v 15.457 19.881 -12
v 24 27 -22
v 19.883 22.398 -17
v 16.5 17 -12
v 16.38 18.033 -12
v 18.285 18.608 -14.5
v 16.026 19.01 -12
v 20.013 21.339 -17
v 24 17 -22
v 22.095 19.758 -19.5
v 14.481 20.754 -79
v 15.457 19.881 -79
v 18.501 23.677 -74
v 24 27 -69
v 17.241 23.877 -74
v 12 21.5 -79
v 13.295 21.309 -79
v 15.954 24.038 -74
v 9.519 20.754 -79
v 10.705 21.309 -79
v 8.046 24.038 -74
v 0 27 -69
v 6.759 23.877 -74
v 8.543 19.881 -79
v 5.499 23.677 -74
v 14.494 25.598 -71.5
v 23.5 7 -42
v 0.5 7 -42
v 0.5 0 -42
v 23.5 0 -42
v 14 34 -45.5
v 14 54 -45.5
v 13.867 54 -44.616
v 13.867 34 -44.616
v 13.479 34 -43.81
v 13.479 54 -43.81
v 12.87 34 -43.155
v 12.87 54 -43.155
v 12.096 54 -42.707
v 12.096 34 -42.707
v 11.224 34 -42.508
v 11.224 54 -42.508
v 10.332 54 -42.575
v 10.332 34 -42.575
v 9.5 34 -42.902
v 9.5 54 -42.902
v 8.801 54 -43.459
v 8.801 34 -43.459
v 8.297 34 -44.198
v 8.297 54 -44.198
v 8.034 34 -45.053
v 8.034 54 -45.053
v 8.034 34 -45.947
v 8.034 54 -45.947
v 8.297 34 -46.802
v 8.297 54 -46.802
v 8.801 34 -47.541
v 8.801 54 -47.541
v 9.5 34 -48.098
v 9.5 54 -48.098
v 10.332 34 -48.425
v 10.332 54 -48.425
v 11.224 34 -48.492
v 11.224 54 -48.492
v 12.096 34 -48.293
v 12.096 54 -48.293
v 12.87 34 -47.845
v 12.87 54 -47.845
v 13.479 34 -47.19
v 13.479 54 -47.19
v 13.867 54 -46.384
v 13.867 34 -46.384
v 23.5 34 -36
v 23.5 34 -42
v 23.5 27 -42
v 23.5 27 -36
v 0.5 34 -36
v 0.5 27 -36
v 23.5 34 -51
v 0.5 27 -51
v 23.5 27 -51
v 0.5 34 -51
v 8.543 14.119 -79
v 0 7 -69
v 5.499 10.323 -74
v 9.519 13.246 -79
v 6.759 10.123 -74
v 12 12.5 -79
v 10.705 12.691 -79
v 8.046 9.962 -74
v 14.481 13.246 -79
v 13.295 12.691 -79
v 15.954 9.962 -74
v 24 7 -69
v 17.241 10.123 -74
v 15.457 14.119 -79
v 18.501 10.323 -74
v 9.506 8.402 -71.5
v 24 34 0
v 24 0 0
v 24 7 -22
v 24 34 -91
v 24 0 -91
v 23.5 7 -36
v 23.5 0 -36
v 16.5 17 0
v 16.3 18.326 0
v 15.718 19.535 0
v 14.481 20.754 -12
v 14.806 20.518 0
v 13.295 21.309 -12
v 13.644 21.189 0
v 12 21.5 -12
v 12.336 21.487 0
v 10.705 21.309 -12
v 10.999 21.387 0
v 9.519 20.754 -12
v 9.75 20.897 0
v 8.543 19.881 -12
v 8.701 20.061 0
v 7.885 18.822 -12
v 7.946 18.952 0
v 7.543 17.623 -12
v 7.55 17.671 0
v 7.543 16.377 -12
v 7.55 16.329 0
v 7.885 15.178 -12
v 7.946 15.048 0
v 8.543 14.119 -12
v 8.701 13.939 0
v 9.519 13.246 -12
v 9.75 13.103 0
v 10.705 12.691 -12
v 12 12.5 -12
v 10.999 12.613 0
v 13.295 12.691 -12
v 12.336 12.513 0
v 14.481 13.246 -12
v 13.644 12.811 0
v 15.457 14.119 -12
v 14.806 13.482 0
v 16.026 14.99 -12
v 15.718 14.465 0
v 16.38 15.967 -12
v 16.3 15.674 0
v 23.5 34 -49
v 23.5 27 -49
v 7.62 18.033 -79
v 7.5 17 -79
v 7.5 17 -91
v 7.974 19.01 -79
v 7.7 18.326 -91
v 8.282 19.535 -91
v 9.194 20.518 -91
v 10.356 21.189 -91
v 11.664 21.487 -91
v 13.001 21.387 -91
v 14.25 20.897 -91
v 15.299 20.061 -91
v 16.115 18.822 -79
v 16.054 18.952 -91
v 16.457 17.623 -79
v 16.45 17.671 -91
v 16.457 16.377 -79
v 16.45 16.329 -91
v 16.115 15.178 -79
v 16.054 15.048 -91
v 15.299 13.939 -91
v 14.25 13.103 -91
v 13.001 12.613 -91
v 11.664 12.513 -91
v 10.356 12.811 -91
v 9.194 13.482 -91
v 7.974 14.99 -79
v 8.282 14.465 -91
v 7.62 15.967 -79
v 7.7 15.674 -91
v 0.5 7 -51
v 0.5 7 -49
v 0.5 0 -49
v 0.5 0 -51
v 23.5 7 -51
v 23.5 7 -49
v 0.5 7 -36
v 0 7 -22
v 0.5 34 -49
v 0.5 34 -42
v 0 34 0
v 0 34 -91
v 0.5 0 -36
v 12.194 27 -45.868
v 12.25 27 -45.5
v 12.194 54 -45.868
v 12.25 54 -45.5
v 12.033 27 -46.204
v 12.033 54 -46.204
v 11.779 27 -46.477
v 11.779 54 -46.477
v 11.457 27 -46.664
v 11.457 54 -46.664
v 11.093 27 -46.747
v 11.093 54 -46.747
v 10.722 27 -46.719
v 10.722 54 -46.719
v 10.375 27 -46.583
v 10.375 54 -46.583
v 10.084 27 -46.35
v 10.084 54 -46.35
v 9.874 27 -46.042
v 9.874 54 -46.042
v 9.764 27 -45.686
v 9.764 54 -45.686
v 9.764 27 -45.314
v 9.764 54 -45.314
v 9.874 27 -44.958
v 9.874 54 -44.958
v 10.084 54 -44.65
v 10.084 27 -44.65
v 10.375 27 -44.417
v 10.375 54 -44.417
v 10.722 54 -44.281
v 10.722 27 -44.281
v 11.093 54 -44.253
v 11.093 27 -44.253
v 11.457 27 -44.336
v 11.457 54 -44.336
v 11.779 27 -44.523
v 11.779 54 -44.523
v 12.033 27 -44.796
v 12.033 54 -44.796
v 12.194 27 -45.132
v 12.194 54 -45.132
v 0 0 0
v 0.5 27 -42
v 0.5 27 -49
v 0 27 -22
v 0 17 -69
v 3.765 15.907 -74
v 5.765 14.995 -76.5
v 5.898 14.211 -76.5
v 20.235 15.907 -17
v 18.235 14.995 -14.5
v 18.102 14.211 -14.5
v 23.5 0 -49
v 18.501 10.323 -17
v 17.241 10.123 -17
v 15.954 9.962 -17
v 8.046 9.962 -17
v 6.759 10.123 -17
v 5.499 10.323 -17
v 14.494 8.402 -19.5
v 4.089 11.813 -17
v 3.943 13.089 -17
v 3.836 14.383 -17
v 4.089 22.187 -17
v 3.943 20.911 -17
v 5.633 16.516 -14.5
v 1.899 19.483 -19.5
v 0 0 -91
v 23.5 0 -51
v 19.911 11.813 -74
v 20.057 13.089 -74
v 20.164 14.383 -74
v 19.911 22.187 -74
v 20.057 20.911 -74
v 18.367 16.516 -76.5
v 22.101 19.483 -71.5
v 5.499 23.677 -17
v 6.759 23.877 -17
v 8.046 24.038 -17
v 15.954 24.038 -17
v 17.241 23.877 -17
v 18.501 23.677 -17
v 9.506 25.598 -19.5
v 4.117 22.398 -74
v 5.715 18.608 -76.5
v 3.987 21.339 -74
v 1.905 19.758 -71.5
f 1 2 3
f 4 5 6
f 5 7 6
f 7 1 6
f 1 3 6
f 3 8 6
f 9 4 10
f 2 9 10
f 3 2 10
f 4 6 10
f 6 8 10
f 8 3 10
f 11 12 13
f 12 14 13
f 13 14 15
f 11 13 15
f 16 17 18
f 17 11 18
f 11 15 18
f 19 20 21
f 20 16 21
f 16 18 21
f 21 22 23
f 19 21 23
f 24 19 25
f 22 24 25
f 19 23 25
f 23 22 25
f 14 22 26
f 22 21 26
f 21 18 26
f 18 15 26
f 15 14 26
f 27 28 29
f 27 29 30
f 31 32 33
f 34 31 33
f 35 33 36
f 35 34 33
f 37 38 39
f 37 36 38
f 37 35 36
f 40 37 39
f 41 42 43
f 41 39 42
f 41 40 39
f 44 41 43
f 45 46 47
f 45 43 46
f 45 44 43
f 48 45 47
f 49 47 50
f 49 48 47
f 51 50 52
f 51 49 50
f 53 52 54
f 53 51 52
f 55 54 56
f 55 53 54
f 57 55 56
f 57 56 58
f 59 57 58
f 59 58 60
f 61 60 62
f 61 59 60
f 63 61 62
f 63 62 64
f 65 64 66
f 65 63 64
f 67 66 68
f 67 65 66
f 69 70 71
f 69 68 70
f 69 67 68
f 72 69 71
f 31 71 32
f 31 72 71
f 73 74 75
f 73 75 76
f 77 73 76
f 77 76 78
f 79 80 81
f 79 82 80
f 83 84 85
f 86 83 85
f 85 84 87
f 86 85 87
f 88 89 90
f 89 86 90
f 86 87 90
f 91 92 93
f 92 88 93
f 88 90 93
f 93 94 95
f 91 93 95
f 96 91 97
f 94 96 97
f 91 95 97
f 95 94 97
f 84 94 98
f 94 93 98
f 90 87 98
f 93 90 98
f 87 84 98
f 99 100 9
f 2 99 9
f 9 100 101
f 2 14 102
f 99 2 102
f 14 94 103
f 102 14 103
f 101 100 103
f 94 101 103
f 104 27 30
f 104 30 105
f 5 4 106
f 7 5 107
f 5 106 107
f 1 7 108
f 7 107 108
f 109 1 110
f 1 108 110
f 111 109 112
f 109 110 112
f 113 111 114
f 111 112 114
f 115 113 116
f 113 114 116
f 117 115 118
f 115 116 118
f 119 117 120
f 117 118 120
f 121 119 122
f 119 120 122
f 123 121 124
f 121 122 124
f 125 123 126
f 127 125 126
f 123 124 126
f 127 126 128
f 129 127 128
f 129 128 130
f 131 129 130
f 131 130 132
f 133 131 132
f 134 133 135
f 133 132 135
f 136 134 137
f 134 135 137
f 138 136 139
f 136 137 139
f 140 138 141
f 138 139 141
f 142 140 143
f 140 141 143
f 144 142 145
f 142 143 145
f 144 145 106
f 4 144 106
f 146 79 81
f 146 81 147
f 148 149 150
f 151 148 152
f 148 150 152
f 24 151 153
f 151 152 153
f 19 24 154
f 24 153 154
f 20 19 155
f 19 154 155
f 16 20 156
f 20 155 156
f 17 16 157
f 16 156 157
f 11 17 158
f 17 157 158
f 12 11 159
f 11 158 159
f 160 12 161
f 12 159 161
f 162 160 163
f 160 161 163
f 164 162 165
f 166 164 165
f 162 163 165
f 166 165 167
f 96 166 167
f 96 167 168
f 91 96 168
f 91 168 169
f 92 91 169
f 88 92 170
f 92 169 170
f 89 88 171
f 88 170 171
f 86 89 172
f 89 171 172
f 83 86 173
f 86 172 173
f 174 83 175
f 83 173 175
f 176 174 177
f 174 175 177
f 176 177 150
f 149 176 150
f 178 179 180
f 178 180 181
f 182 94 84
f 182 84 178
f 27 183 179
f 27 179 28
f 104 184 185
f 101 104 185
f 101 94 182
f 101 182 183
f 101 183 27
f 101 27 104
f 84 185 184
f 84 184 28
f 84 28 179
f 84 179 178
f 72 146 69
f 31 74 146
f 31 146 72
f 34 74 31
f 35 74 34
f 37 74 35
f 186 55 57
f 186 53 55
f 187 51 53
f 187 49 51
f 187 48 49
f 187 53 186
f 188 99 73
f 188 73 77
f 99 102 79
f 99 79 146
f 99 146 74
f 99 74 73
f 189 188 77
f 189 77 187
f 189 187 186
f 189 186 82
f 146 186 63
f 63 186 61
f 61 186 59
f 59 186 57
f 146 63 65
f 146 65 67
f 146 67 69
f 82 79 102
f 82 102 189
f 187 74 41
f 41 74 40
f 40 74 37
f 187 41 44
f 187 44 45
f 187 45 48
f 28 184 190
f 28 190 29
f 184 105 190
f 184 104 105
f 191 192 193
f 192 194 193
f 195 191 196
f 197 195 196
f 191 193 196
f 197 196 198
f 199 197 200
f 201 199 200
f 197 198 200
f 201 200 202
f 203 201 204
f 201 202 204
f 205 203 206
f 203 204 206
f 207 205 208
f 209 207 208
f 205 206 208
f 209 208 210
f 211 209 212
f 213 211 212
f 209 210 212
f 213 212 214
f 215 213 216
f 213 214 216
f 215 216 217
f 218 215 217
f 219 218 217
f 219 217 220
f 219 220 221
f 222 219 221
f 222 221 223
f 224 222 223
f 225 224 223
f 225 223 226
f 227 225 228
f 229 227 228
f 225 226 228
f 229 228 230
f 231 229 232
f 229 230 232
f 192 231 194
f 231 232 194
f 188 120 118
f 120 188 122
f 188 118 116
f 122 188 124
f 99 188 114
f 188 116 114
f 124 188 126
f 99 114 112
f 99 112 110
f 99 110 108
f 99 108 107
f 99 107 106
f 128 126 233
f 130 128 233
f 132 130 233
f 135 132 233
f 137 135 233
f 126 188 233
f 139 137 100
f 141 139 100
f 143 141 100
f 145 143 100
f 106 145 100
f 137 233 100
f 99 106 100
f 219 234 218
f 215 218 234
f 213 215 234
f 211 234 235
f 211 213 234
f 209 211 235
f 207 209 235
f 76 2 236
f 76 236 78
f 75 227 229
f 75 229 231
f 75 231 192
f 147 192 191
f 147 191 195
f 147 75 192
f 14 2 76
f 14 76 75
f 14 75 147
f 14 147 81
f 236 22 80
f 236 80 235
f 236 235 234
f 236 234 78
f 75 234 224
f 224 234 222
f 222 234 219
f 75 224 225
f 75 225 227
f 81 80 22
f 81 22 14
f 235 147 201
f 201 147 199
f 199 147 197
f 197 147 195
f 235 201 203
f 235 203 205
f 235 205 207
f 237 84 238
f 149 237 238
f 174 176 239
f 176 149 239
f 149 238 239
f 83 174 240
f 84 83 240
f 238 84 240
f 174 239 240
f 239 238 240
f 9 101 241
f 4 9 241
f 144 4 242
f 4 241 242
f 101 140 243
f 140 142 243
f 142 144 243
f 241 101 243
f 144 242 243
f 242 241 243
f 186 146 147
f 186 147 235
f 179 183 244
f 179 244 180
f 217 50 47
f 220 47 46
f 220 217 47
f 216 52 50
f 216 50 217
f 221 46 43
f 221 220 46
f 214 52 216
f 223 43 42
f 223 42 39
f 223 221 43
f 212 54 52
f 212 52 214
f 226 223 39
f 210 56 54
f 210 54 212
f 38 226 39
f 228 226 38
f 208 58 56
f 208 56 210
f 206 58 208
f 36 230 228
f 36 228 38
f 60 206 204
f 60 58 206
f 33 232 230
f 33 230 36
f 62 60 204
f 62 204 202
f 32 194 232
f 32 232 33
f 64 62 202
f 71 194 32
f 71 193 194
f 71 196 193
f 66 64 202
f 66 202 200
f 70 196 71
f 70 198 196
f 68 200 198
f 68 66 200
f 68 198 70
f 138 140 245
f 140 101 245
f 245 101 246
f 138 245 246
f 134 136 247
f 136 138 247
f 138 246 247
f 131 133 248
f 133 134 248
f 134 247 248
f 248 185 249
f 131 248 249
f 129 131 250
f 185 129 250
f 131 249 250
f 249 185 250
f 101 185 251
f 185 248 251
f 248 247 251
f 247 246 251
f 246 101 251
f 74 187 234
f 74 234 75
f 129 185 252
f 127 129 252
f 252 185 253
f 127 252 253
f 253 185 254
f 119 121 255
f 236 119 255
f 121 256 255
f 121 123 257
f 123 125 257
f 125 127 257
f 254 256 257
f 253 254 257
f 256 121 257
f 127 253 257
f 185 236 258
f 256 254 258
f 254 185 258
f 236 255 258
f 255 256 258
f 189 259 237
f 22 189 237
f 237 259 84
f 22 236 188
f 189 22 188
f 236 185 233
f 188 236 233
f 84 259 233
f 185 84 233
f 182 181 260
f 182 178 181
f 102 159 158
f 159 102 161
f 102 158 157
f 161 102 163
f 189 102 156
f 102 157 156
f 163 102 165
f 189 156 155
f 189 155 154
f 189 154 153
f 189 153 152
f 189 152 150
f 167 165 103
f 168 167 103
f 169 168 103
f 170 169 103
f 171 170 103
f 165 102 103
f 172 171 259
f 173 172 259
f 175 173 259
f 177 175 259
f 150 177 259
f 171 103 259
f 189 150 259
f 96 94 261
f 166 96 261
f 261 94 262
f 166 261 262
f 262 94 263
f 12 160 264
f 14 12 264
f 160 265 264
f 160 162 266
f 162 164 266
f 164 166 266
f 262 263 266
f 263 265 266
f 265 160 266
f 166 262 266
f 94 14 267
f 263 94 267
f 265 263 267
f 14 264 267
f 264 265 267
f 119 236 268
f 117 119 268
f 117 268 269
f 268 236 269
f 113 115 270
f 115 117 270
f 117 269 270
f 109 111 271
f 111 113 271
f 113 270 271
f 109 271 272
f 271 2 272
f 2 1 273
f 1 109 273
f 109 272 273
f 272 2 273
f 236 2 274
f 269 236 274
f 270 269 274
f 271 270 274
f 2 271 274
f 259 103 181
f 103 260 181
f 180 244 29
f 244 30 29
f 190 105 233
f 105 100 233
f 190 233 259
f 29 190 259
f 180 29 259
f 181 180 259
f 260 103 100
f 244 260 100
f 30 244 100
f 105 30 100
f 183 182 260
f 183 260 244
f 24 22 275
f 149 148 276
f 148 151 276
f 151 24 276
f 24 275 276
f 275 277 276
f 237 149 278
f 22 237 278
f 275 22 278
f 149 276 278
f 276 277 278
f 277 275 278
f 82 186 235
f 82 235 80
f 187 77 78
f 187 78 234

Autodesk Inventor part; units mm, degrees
ref_plane "YZ Plane" through (0, 0, 0) normal (1, 0, 0) x (0, 1, 0)
ref_plane "XZ Plane" through (0, 0, 0) normal (0, 1, 0) x (-1, 0, 0)
ref_plane "XY Plane" through (0, 0, 0) normal (0, 0, 1) x (1, 0, 0)
sketch "Sketch1" plane through (0, 0, 0) normal (0, 1, 0) x (-1, 0, 0)
  line L0 (0, 0) -> (-24, 0)
  line L1 (-24, 0) -> (-24, -91)
  line L2 (-24, -91) -> (0, -91)
  line L3 (0, -91) -> (0, 0)
  dimension "d0" = 91
  dimension "d1" = 24
extrude "Extrusion1" add sketch "Sketch1" along normal blind 34
sketch "Sketch2" plane through (24, 0, 0) normal (1, 0, 0) x (0, 0, -1)
  line L0 (22, 27) -> (69, 27)
  line L1 (69, 27) -> (69, 7)
  line L2 (69, 7) -> (22, 7)
  line L3 (22, 7) -> (22, 27)
  line L4 (0, 34) -> (91, 34) projected
  line L5 (0, 0) -> (91, 0) projected
  line L6 (0, 0) -> (0, 34) projected
  line L7 (91, 0) -> (91, 34) projected
  dimension "d4" = 7
  dimension "d5" = 7
  dimension "d6" = 22
  dimension "d7" = 22
extrude "Extrusion2" cut sketch "Sketch2" against normal up to surface (24 mm away) contours L0 L1 L2 L3
sketch "Sketch3" plane through (0, 34, 0) normal (0, 1, 0) x (1, 0, 0)
  line L0 (0.5, 42) -> (23.5, 42)
  line L1 (23.5, 42) -> (23.5, 36)
  line L2 (23.5, 36) -> (0.5, 36)
  line L3 (0.5, 36) -> (0.5, 42)
  line L4 (0, 91) -> (0, 0) projected
  line L5 (24, 0) -> (24, 91) projected
  line L6 (0, 0) -> (24, 0) projected
  dimension "d10" = 0.5
  dimension "d11" = 0.5
  dimension "d12" = 6
  dimension "d13" = 36
extrude "Extrusion3" cut sketch "Sketch3" against normal up to surface (34 mm away)
sketch "Sketch4" plane through (0, 34, 0) normal (0, 1, 0) x (1, 0, 0)
  line L0 (0.5, 51) -> (23.5, 51)
  line L1 (23.5, 51) -> (23.5, 49)
  line L2 (23.5, 49) -> (0.5, 49)
  line L3 (0.5, 49) -> (0.5, 51)
  line L4 (0.5, 42) -> (23.5, 42) projected
  line L5 (24, 0) -> (24, 91) projected
  line L6 (0, 91) -> (0, 0) projected
  dimension "d16" = 2
  dimension "d17" = 7
  dimension "d18" = 0.5
  dimension "d19" = 0.5
extrude "Extrusion4" cut sketch "Sketch4" against normal up to surface (34 mm away)
sketch "Sketch5" plane through (0, 0, 0) normal (0, 0, 1) x (1, 0, 0)
  circle A0 centre (12, 17) radius 4.5
  line L0 (0, 0) -> (24, 0) projected
  line L1 (24, 0) -> (24, 34) projected
  dimension "d22" = 17
  dimension "d23" = 12
  dimension "d24" = 9
extrude "Extrusion5" cut sketch "Sketch5" against normal blind 12
loft "Loft1" cut section 1 edges at (7.5, 17, -12) section 2 edges at (0, 17, -22) (12, 27, -22) (24, 17, -22) (12, 7, -22)
sketch "Sketch6" plane through (24, 0, -91) normal (0, 0, -1) x (-1, 0, 0)
  circle A0 centre (12, 17) radius 4.5
  line L0 (24, 0) -> (24, 34) projected
  line L1 (0, 0) -> (24, 0) projected
  dimension "d31" = 12
  dimension "d32" = 17
  dimension "d33" = 9
extrude "Extrusion6" cut sketch "Sketch6" against normal blind 12
loft "Loft2" cut section 1 edges at (16.5, 17, -79) section 2 edges at (0, 17, -69) (12, 7, -69) (24, 17, -69) (12, 27, -69)
sketch "Sketch7" plane through (0, 34, 0) normal (0, 1, 0) x (1, 0, 0)
  circle A0 centre (11, 45.5) radius 3
  line L0 (0, 91) -> (0, 0) projected
  line L1 (24, 0) -> (24, 91) projected
  line L2 (0.5, 42) -> (23.5, 42) projected
  line L3 (23.5, 49) -> (0.5, 49) projected
  dimension "d40" = 11
  dimension "d41" = 13
  dimension "d42" = 3.5
  dimension "d43" = 3.5
  dimension "d44" = 6
extrude "Extrusion7" add sketch "Sketch7" along normal blind 20
sketch "Sketch8" plane through (11, 54, -45.5) normal (0, 1, 0) x (1, 0, 0)
  circle A0 centre (0, 0) radius 1.25
  point P0 (-11, -45.5)
  dimension "d47" = 2.5
extrude "Extrusion8" cut sketch "Sketch8" against normal up to surface (27 mm away)
properties part number "20220727_1cell_PBME"
